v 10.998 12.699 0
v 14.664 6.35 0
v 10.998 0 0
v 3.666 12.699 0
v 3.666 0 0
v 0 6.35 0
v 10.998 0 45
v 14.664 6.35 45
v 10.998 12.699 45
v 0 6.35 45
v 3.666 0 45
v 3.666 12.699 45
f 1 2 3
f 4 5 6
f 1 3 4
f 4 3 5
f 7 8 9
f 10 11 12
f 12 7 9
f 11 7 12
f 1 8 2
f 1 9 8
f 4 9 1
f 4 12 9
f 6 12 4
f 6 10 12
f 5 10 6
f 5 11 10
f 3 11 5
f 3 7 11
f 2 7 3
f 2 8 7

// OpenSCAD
$fn = 32;

// ----------------------------------------------------------------------
// Key bar: hex key, 45 mm thick
// ----------------------------------------------------------------------

// --- parameters (mm) ---
profile_height = 45;      // extrusion height
profile_points = 6;       // points of the closed outline

profile = [[14.664, 6.35], [10.998, 12.699], [3.666, 12.699], [0, 6.35], [3.666, 0], [10.998, 0]];  // single closed polygon, 6 points, counter clockwise

// --- the one profile operation ---
linear_extrude(height = profile_height) polygon(points = profile);
